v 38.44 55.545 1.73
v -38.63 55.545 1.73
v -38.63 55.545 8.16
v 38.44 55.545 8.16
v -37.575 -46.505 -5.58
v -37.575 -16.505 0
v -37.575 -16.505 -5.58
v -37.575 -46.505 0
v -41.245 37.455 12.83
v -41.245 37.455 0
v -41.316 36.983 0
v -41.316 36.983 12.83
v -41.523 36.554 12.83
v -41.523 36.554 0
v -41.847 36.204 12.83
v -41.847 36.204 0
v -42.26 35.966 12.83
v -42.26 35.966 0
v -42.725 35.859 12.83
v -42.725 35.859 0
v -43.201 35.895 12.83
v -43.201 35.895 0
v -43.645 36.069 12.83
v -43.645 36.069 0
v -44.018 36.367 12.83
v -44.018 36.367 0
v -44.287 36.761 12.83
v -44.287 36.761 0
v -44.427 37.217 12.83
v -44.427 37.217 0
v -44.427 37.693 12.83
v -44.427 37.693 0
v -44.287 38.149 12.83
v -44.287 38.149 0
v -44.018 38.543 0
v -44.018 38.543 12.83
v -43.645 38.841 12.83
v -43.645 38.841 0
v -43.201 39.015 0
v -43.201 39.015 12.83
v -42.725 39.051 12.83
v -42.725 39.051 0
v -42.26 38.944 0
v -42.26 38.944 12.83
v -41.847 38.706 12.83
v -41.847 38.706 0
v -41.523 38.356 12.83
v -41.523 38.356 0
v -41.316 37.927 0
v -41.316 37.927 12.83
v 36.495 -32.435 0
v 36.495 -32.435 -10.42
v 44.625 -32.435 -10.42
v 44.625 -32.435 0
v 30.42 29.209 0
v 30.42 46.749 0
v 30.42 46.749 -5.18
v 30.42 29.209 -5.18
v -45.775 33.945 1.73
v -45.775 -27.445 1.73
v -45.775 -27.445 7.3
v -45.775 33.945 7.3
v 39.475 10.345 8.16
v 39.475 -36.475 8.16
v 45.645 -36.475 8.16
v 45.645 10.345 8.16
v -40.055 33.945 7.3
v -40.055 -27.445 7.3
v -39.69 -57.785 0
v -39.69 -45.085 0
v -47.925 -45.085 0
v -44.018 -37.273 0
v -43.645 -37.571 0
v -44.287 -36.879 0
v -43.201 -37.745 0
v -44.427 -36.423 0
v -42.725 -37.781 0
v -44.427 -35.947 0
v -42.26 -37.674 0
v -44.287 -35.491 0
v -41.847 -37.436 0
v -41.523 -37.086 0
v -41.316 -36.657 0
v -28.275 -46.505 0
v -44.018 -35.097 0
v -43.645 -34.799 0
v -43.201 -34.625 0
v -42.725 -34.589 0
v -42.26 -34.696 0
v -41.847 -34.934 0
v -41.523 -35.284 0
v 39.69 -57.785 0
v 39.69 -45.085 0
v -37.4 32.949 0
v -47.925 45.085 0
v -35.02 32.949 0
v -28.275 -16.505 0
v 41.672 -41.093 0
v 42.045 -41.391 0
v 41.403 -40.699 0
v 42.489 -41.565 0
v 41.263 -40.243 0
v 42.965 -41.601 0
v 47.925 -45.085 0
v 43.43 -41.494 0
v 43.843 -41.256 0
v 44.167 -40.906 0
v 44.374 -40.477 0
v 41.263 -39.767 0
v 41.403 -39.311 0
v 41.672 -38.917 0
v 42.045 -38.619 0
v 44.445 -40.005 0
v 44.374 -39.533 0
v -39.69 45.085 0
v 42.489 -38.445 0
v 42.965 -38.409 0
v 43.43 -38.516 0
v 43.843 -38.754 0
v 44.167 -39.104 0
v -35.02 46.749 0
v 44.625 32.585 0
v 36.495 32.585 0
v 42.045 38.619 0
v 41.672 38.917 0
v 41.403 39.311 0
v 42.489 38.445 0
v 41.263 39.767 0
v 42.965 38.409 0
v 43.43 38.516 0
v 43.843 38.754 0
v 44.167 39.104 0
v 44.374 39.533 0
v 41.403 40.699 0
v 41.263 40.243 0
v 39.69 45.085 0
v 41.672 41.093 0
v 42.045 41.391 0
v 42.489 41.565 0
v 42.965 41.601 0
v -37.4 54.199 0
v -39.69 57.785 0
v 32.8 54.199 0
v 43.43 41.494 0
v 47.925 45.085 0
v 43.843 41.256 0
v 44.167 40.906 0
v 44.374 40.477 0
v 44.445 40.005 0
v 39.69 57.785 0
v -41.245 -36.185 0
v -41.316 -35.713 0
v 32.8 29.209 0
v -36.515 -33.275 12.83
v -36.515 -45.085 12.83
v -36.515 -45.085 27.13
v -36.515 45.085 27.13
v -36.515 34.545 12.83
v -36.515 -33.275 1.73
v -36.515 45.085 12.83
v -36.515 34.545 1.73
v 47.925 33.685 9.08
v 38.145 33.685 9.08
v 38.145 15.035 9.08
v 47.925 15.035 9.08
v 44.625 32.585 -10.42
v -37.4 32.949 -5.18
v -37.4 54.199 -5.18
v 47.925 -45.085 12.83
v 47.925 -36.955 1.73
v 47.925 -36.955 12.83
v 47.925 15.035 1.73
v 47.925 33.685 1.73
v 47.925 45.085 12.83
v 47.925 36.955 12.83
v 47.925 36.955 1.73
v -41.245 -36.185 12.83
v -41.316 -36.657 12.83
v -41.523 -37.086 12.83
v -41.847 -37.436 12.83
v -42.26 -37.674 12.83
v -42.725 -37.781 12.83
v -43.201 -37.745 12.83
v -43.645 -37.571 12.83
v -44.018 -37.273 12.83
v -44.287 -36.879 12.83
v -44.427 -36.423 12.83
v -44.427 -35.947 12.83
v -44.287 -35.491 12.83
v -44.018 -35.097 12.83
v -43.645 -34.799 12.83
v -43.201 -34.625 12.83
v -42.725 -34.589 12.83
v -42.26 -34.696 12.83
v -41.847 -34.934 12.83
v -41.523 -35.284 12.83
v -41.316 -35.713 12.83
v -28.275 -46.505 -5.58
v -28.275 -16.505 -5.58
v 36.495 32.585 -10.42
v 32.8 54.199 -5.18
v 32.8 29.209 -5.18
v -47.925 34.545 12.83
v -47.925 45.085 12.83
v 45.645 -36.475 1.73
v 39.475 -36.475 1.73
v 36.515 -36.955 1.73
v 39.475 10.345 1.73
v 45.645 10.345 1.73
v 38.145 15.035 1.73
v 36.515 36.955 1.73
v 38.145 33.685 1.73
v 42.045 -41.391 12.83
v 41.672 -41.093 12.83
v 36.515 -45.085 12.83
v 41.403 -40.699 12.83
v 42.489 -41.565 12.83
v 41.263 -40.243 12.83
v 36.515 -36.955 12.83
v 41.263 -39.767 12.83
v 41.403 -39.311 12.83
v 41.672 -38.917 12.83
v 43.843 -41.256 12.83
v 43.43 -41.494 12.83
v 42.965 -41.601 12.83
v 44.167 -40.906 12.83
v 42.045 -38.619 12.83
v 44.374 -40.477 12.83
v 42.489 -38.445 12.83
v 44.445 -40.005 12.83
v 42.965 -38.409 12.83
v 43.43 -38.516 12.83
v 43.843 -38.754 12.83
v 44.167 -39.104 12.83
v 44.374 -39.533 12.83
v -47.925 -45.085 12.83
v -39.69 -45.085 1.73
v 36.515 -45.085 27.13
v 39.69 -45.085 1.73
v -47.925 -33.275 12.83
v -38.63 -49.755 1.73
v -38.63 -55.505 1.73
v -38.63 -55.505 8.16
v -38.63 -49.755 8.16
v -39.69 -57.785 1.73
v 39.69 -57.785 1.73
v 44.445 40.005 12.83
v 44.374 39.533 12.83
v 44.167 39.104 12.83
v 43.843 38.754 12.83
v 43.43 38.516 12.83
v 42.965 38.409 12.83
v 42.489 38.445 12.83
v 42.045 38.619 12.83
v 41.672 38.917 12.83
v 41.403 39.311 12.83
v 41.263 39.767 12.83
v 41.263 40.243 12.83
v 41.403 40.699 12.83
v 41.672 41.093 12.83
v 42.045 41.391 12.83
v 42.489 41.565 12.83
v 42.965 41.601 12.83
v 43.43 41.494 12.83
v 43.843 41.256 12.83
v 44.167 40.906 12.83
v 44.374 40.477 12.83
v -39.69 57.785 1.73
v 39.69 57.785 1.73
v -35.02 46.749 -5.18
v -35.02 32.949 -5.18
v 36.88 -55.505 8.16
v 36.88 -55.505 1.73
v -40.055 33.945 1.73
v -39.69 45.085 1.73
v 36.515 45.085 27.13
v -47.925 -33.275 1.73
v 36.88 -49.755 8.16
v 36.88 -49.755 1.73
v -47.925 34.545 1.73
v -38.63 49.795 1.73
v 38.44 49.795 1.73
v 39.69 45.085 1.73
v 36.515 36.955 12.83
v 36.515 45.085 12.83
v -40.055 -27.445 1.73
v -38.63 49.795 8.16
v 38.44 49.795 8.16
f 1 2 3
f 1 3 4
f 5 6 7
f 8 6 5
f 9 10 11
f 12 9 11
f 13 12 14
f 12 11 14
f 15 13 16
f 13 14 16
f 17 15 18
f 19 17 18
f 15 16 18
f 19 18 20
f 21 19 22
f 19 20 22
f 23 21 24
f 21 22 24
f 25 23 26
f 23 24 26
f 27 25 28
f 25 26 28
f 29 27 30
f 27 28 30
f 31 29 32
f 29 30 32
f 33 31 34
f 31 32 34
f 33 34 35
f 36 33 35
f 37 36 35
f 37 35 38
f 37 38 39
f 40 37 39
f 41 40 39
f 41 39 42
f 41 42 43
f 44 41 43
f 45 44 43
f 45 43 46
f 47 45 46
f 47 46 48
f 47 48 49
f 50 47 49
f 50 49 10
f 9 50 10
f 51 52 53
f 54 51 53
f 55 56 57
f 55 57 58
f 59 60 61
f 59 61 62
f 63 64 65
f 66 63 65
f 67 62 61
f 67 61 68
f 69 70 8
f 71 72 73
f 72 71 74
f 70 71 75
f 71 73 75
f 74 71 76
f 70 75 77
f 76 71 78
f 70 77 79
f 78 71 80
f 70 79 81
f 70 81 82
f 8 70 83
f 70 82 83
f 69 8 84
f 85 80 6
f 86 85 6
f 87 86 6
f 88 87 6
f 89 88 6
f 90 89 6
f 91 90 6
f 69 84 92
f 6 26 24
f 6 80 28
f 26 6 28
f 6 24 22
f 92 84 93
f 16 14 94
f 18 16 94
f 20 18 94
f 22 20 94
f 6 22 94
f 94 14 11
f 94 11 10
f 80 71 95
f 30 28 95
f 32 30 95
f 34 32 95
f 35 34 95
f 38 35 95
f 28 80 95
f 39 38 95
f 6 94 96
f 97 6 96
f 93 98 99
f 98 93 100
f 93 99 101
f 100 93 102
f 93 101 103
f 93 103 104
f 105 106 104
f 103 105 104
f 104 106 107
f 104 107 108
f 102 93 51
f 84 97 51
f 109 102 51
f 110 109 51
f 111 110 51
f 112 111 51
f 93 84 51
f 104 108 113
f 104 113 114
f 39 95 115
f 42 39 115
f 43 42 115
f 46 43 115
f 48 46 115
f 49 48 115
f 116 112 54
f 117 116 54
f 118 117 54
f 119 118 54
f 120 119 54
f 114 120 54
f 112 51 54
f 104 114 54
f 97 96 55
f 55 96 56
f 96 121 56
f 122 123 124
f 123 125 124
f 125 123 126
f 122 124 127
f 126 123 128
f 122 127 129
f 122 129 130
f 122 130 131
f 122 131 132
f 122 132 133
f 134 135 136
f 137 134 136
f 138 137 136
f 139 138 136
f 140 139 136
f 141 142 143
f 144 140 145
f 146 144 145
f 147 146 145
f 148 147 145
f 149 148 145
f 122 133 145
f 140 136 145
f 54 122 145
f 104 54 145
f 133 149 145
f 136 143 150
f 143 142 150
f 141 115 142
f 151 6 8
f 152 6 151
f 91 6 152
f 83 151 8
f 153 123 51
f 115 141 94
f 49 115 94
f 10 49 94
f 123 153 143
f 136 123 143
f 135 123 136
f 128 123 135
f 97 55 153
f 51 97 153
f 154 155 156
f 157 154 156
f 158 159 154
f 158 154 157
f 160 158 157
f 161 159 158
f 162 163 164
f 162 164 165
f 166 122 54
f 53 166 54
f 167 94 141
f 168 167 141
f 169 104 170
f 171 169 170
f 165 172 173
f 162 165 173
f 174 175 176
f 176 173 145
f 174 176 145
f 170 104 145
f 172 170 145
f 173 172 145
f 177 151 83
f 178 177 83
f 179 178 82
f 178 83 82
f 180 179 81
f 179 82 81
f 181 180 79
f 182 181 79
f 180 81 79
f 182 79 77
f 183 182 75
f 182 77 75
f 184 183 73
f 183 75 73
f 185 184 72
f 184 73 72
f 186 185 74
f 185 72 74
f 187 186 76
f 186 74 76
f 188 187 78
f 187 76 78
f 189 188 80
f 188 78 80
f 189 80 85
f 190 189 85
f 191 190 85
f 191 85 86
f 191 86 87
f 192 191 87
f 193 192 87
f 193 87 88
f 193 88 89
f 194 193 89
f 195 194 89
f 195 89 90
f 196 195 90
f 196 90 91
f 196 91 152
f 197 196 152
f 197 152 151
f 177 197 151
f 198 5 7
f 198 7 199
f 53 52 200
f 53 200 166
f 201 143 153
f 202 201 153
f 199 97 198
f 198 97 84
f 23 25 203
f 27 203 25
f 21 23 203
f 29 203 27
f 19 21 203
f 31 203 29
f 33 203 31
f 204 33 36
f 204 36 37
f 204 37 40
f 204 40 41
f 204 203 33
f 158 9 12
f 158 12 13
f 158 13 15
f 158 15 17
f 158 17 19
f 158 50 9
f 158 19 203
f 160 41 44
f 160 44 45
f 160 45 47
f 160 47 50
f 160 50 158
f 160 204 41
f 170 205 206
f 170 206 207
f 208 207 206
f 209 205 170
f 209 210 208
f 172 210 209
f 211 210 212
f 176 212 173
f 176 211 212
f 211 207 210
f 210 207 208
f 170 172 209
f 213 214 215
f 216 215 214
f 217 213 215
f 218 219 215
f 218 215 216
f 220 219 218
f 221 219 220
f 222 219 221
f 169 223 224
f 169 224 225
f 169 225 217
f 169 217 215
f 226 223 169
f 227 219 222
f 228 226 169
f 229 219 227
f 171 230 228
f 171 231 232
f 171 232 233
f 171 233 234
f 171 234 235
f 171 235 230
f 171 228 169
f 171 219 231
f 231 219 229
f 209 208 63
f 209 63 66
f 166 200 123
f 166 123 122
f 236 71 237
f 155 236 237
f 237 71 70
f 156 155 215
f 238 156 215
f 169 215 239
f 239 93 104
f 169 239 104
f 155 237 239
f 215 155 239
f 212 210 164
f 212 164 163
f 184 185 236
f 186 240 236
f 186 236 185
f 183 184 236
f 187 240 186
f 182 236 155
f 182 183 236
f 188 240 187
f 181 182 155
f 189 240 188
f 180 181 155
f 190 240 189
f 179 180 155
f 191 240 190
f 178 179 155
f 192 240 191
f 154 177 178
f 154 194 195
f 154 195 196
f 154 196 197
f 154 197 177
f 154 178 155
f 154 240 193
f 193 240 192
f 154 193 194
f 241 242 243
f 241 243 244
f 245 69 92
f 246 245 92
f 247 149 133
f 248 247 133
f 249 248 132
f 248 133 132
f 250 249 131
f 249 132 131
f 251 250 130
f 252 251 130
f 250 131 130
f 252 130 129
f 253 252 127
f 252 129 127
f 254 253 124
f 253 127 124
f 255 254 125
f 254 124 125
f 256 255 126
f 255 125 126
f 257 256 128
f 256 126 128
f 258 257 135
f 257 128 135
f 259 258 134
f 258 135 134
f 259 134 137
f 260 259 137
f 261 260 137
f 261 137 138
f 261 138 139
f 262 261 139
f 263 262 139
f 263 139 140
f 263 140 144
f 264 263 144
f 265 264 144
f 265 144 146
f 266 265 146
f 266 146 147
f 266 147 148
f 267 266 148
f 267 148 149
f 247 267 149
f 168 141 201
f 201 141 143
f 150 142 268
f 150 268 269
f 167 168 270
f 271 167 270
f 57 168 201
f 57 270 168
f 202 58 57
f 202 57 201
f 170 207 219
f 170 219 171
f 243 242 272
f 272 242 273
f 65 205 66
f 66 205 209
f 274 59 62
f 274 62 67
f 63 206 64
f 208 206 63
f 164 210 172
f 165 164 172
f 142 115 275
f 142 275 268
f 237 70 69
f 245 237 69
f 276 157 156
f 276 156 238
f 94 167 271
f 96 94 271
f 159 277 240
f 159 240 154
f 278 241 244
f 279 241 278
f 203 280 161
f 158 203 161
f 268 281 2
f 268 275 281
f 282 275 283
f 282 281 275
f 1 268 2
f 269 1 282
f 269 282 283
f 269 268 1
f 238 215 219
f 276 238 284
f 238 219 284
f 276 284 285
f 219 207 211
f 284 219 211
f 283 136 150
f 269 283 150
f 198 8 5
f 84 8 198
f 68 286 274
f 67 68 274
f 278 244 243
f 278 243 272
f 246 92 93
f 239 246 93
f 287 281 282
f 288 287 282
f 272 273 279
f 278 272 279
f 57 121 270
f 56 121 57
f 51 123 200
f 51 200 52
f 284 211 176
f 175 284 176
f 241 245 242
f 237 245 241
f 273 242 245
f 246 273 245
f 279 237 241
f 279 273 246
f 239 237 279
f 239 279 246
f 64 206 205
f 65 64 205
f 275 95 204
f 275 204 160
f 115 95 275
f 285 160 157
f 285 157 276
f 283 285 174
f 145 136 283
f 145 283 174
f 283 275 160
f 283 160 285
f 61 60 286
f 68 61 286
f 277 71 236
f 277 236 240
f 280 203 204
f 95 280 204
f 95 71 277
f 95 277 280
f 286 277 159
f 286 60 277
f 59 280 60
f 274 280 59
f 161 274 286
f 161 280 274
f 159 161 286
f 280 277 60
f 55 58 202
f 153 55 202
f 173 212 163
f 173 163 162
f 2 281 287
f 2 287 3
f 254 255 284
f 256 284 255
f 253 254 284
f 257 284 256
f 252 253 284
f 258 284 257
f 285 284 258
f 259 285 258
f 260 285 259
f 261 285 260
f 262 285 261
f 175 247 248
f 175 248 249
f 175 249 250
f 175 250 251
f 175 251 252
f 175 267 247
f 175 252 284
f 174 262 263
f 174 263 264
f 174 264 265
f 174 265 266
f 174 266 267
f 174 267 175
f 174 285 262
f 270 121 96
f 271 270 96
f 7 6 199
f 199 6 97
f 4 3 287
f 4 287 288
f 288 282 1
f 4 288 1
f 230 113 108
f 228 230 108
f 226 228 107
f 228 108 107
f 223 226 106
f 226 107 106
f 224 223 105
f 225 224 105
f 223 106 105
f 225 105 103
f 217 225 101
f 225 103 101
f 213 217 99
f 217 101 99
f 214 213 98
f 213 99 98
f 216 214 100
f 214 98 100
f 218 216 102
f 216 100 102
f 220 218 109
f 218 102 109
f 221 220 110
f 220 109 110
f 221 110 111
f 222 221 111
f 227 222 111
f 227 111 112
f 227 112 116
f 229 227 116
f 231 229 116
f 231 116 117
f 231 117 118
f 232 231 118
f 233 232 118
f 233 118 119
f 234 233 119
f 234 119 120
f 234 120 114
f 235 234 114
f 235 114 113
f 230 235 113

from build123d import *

# Parameters (mm, degrees)
F0_W      = 8.235
F0_H      = 90.17
F0_W_2    = 79.38
F0_H_2    = 12.7
F1_DEPTH  = 1.73
F2_W      = 8.13
F2_H      = 65.02
F3_DEPTH  = 10.42
F4_W      = 2.38
F4_H      = 13.8
F4_H_2    = 7.45
F4_W_2    = 65.44
F4_H_3    = 17.54
F5_DEPTH  = 5.18
F6_W      = 9.3
F6_H      = 30
F7_DEPTH  = 5.58
F8_W      = 73.03
F8_H      = 90.17
F9_DEPTH  = 25.4
F10_W     = 11.41
F10_H     = 8.13
F10_H_2   = 10.54
F10_H_3   = 11.81
F11_DEPTH = 11.1
F12_W     = 75.51
F12_H     = 5.75
F13_DEPTH = 6.43
F14_W     = 5.72
F14_H     = 61.39
F15_DEPTH = 5.57
F16_W     = 77.07
F16_H     = 5.75
F17_DEPTH = 6.43
F18_W     = 6.17
F18_H     = 46.82
F19_DEPTH = 6.43
F20_W     = 9.78
F20_H     = 18.65
F21_DEPTH = 7.35
F22_R     = 1.6
F23_DEPTH = 27.131


with BuildPart() as f1:
    # F0 (on Top) → F1 (new body)
    with BuildSketch(Plane.XY):
        with Locations((43.8075, 0)):
            Rectangle(F0_W, F0_H)
        with Locations((0, -51.435)):
            Rectangle(F0_W_2, F0_H_2)
        Rectangle(F0_W_2, F0_H)
        with Locations((-43.8075, 0)):
            Rectangle(F0_W, F0_H)
        with Locations((0, 51.435)):
            Rectangle(F0_W_2, F0_H_2)
    extrude(amount=F1_DEPTH)

    # F2 (on face) → F3 (join)
    with BuildSketch(Plane(origin=(0, 0, 0), x_dir=(1, 0, 0), z_dir=(0, 0, -1))):
        with Locations((40.56, -0.075)):
            Rectangle(F2_W, F2_H)
    extrude(amount=F3_DEPTH)

    # F4 (on face) → F5 (join)
    with BuildSketch(Plane(origin=(0, 0, 0), x_dir=(1, 0, 0), z_dir=(0, 0, -1))):
        with Locations((-36.21, -39.8490008428)):
            Rectangle(F4_W, F4_H)
        with Locations((-36.21, -50.4740008428)):
            Rectangle(F4_W, F4_H_2)
        with Locations((-2.3, -50.4740008428)):
            Rectangle(F4_W_2, F4_H_2)
        with Locations((31.61, -37.9790008428)):
            Rectangle(F4_W, F4_H_3)
        with Locations((31.61, -50.4740008428)):
            Rectangle(F4_W, F4_H_2)
    extrude(amount=F5_DEPTH)

    # F6 (on face) → F7 (join)
    with BuildSketch(Plane(origin=(0, 0, 0), x_dir=(1, 0, 0), z_dir=(0, 0, -1))):
        with Locations((-32.925, 31.505)):
            Rectangle(F6_W, F6_H)
    extrude(amount=F7_DEPTH)

    # F8 (on face) → F9 (join)
    with BuildSketch(Plane.XY.offset(1.73)):
        Rectangle(F8_W, F8_H)
    extrude(amount=F9_DEPTH)

    # F10 (on face) → F11 (join)
    with BuildSketch(Plane.XY.offset(1.73)):
        with Locations((42.22, 41.02)):
            Rectangle(F10_W, F10_H)
        with Locations((42.22, -41.02)):
            Rectangle(F10_W, F10_H)
        with Locations((-42.22, 39.815)):
            Rectangle(F10_W, F10_H_2)
        with Locations((-42.22, -39.18)):
            Rectangle(F10_W, F10_H_3)
    extrude(amount=F11_DEPTH)

    # F12 (on face) → F13 (join)
    with BuildSketch(Plane.XY.offset(1.73)):
        with Locations((-0.875, -52.63)):
            Rectangle(F12_W, F12_H)
    extrude(amount=F13_DEPTH)

    # F14 (on face) → F15 (join)
    with BuildSketch(Plane.XY.offset(1.73)):
        with Locations((-42.915, 3.25)):
            Rectangle(F14_W, F14_H)
    extrude(amount=F15_DEPTH)

    # F16 (on face) → F17 (join)
    with BuildSketch(Plane.XY.offset(1.73)):
        with Locations((-0.095, 52.67)):
            Rectangle(F16_W, F16_H)
    extrude(amount=F17_DEPTH)

    # F18 (on face) → F19 (join)
    with BuildSketch(Plane.XY.offset(1.73)):
        with Locations((42.56, -13.065)):
            Rectangle(F18_W, F18_H)
    extrude(amount=F19_DEPTH)

    # F20 (on face) → F21 (join)
    with BuildSketch(Plane.XY.offset(1.73)):
        with Locations((43.035, 24.36)):
            Rectangle(F20_W, F20_H)
    extrude(amount=F21_DEPTH)

    # F22 (on face) → F23 (cut, through all)
    with BuildSketch(Plane(origin=(0, 0, 0), x_dir=(1, 0, 0), z_dir=(0, 0, -1))):
        with Locations((42.845, 40.005)):
            Circle(F22_R)
        with Locations((42.845, -40.005)):
            Circle(F22_R)
        with Locations((-42.845, -37.455)):
            Circle(F22_R)
        with Locations((-42.845, 36.185)):
            Circle(F22_R)
    extrude(amount=-F23_DEPTH, mode=Mode.SUBTRACT)


solid = f1.part
